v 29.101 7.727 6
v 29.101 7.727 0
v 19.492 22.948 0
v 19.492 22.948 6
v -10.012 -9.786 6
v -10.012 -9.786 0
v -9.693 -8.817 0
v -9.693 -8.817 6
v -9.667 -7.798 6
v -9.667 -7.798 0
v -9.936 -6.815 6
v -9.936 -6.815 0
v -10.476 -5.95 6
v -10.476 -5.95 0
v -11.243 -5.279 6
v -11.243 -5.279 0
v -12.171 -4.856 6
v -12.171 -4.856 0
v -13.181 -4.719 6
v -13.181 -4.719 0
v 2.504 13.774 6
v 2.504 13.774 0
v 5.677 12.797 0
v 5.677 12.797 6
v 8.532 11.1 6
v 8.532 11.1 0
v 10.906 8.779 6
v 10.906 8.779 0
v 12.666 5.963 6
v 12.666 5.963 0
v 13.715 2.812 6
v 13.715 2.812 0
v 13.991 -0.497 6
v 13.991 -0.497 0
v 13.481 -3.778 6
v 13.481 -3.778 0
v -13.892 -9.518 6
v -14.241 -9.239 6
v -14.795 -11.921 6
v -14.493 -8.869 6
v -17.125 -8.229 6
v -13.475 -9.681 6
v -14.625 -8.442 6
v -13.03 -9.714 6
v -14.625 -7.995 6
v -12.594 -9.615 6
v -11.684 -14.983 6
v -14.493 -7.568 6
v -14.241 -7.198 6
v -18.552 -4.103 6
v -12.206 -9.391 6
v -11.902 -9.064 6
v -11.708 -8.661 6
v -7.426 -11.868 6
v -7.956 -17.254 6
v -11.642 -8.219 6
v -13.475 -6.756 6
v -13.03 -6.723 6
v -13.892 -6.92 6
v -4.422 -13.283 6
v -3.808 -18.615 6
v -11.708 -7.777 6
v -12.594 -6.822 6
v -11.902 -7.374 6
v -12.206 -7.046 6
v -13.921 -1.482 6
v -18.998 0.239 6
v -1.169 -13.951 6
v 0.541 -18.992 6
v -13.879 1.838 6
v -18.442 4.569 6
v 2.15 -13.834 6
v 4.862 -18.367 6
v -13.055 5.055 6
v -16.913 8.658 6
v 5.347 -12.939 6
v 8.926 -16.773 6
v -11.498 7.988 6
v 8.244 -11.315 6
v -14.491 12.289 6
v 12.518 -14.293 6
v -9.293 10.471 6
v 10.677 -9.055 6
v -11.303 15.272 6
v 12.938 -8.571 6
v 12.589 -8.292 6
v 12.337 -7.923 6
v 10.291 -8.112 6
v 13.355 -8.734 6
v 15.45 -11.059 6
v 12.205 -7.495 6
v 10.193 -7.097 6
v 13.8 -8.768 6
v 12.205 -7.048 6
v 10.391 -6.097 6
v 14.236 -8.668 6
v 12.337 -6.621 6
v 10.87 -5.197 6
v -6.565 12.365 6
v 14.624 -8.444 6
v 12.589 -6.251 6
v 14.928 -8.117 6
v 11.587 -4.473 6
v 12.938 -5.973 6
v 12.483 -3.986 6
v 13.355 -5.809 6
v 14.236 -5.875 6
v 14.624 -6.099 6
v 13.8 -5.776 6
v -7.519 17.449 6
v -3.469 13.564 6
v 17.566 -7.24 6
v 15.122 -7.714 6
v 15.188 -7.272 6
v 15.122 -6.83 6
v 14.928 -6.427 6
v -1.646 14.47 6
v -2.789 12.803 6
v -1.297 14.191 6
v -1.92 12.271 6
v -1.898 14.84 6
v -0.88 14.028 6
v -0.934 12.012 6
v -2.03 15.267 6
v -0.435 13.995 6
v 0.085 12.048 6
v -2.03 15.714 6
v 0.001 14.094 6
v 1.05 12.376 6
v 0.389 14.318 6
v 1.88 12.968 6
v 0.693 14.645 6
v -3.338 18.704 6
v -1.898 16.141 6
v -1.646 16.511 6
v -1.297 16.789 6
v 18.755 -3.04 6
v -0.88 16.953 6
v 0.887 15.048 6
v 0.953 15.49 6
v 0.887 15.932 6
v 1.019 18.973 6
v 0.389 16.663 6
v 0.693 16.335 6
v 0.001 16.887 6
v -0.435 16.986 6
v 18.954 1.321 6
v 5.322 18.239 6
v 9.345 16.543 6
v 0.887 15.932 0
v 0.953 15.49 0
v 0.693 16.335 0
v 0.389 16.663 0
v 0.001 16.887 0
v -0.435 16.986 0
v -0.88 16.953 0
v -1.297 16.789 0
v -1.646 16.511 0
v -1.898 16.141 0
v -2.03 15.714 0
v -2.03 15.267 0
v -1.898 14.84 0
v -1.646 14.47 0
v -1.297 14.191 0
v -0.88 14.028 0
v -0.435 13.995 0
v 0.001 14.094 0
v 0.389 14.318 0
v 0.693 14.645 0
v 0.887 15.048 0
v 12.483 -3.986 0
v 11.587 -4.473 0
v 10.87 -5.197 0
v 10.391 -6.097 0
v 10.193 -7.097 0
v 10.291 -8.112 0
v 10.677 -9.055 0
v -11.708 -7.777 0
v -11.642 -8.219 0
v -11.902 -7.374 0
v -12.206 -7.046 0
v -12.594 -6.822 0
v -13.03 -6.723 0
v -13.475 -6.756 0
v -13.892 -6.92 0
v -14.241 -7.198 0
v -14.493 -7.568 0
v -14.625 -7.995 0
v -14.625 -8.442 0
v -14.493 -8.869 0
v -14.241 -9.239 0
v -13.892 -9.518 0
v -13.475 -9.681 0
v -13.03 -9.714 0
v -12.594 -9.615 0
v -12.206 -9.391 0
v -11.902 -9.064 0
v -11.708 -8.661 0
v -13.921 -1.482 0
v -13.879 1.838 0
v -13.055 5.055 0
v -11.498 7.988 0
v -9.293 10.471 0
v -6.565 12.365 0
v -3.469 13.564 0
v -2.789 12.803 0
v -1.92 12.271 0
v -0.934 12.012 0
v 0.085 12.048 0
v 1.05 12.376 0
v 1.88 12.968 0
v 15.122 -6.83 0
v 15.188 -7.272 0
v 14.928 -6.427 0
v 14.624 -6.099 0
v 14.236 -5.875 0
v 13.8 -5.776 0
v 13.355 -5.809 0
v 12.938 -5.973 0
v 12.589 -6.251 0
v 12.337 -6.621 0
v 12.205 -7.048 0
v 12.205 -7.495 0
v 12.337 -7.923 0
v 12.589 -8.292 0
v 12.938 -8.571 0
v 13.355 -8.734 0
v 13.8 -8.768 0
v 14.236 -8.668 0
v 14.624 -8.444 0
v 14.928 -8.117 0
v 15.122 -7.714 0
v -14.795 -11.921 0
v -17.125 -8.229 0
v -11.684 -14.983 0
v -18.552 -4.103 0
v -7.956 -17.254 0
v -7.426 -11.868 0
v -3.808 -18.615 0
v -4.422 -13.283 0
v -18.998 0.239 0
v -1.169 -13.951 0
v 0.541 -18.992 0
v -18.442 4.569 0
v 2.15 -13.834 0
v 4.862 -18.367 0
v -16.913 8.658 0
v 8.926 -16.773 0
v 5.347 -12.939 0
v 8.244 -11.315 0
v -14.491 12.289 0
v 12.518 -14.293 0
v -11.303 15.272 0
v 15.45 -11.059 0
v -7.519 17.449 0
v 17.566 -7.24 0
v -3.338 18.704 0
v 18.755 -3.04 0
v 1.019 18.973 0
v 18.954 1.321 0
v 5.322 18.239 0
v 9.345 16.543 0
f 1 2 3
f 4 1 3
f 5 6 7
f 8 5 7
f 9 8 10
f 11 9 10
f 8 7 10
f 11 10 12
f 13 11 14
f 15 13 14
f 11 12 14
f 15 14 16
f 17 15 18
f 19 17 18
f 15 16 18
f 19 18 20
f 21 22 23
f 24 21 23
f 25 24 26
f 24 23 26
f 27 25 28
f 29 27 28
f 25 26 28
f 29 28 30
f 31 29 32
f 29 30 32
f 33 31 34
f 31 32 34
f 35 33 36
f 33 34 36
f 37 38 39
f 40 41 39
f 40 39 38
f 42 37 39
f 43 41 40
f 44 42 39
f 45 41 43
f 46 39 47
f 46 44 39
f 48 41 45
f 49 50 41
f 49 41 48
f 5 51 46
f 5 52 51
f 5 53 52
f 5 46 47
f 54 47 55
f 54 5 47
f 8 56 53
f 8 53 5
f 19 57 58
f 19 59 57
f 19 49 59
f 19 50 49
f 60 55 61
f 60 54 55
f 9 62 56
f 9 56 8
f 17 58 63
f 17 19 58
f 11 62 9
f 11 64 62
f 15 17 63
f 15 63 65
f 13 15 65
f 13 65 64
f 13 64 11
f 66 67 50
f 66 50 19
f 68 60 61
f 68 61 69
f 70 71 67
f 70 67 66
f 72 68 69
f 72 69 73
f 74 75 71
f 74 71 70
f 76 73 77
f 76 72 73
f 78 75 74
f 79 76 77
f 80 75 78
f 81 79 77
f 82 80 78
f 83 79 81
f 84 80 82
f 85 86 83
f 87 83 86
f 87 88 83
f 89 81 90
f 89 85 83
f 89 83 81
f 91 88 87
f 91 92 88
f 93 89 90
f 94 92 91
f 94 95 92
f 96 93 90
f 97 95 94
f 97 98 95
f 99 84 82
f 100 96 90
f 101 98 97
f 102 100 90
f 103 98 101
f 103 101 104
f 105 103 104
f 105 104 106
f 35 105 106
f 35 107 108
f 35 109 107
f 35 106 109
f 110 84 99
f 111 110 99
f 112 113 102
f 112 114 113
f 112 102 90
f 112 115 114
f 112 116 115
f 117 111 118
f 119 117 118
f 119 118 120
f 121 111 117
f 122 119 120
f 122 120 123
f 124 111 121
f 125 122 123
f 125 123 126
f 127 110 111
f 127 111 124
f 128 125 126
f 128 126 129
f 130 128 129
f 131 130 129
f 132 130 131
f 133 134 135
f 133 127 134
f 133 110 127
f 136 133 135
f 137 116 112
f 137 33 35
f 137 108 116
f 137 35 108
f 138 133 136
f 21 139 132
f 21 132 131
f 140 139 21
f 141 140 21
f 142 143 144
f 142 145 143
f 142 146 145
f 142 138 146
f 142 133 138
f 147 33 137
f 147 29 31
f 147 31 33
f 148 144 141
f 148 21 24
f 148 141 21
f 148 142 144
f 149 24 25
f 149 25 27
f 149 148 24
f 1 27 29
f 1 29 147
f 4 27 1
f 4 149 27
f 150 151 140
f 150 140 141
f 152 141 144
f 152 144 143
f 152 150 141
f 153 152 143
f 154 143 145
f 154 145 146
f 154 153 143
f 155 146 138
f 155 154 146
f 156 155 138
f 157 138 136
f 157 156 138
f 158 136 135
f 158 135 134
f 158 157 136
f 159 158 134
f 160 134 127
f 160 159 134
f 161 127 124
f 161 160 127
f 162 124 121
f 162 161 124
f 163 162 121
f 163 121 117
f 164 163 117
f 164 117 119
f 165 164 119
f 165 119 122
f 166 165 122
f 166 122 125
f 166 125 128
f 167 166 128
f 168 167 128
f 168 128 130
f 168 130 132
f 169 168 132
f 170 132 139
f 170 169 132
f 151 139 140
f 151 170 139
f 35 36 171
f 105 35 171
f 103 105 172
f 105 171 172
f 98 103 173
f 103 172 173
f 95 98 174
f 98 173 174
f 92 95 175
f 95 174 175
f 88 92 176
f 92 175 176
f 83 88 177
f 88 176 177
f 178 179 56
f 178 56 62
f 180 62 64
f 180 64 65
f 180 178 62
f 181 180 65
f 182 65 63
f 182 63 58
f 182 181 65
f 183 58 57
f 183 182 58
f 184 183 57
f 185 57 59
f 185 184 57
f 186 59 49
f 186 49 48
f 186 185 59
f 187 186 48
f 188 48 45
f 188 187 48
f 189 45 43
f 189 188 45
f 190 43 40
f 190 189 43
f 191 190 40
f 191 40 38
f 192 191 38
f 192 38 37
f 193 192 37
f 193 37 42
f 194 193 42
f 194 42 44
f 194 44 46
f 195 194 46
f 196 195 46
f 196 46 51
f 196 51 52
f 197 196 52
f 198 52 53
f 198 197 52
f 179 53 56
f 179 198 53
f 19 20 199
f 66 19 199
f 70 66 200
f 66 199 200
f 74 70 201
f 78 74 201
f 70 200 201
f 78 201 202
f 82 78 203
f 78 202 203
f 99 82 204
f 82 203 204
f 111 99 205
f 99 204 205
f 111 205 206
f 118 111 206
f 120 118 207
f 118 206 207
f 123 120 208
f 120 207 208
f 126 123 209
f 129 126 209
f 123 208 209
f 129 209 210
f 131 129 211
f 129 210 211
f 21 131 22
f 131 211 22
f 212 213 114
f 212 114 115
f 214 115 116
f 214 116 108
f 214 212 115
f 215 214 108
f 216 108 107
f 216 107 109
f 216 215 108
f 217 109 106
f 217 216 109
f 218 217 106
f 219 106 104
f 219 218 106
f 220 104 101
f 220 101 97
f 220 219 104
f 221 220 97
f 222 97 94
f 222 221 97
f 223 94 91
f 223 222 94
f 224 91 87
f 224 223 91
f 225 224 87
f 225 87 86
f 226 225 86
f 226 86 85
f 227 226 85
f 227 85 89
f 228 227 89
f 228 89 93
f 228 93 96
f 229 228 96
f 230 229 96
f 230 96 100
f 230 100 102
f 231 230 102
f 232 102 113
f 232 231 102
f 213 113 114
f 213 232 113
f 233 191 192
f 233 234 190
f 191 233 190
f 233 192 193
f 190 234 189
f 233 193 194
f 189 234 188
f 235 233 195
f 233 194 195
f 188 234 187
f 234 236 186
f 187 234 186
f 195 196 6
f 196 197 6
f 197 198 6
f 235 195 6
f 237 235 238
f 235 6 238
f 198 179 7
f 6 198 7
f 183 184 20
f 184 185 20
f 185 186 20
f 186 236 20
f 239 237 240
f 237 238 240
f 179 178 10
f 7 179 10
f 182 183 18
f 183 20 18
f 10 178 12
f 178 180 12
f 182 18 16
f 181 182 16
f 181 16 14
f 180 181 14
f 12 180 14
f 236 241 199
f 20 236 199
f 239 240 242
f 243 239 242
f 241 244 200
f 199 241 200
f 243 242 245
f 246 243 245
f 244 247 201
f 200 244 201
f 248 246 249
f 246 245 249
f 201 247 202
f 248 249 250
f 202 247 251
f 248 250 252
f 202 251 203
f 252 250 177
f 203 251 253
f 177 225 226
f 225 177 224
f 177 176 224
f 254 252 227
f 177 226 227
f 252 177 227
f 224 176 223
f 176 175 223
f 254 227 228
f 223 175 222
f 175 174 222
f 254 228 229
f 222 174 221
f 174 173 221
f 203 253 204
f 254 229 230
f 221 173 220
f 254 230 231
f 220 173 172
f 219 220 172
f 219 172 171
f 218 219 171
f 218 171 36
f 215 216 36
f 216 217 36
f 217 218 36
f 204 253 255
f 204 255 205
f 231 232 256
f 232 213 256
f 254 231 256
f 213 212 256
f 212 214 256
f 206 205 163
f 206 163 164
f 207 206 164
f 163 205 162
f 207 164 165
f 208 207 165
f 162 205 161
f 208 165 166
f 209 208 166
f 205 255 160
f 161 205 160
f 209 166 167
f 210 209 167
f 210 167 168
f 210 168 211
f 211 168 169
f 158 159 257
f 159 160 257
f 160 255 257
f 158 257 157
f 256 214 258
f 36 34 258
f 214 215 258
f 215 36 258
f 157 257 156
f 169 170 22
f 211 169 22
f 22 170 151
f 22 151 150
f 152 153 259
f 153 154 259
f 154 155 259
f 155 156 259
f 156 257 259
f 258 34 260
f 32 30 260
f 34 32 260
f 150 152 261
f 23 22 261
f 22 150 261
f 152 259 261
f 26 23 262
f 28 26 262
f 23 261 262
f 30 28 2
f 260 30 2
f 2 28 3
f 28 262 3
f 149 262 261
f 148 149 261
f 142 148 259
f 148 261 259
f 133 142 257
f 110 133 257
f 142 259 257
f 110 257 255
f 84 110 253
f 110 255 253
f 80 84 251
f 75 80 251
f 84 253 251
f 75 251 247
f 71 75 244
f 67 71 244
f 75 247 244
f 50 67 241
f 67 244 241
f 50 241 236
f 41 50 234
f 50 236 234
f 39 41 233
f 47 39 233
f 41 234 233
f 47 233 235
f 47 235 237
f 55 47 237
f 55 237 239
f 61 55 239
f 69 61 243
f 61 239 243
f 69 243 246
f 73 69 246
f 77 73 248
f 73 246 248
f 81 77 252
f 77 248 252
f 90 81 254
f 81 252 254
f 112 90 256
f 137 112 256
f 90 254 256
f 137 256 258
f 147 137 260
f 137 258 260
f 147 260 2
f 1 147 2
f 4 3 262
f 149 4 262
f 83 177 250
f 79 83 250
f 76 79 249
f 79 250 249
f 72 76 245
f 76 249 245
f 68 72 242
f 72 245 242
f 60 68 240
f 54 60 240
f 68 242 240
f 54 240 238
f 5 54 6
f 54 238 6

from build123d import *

# Parameters (mm, degrees)
ESQUISSE1_R        = 1.5
BOSS_EXTRU_3_DEPTH = 6


with BuildPart() as part:
    # Esquisse1 → Boss.-Extru.3 (new body)
    with BuildSketch(Plane.XY):
        with BuildLine():
            Line((29.100926589, 7.727116755), (19.492495604, 22.948090903))
            Line((19.492495604, 22.948090903), (9.344755552, 16.543141892))
            ThreePointArc((9.344755552, 16.543141892), (-16.066583823, -10.142232706), (18.954034468, 1.320824515))
            Line((18.954034468, 1.320824515), (29.100926589, 7.727116755))
        make_face()
        with Locations((-0.546712729, 15.490355231)):
            Circle(ESQUISSE1_R, mode=Mode.SUBTRACT)
        with Locations((-13.14168478, -8.218644727)):
            Circle(ESQUISSE1_R, mode=Mode.SUBTRACT)
        with Locations((13.688397508, -7.271710504)):
            Circle(ESQUISSE1_R, mode=Mode.SUBTRACT)
        with BuildLine():
            ThreePointArc((-3.468577117, 13.56351624), (-0.423261467, 11.992533082), (2.503723019, 13.774301109))
            ThreePointArc((2.503723019, 13.774301109), (11.869908833, 7.423292012), (13.480638187, -3.777882222))
            ThreePointArc((13.480638187, -3.777882222), (10.597469039, -5.629711358), (10.677033171, -9.055438293))
            ThreePointArc((10.677033171, -9.055438293), (0.493805045, -13.991288596), (-10.01206107, -9.785634018))
            ThreePointArc((-10.01206107, -9.785634018), (-10.174207571, -6.362821724), (-13.180756189, -4.718862816))
            ThreePointArc((-13.180756189, -4.718862816), (-12.363713879, 6.567996584), (-3.468577117, 13.56351624))
        make_face(mode=Mode.SUBTRACT)
    extrude(amount=BOSS_EXTRU_3_DEPTH)


solid = part.part
